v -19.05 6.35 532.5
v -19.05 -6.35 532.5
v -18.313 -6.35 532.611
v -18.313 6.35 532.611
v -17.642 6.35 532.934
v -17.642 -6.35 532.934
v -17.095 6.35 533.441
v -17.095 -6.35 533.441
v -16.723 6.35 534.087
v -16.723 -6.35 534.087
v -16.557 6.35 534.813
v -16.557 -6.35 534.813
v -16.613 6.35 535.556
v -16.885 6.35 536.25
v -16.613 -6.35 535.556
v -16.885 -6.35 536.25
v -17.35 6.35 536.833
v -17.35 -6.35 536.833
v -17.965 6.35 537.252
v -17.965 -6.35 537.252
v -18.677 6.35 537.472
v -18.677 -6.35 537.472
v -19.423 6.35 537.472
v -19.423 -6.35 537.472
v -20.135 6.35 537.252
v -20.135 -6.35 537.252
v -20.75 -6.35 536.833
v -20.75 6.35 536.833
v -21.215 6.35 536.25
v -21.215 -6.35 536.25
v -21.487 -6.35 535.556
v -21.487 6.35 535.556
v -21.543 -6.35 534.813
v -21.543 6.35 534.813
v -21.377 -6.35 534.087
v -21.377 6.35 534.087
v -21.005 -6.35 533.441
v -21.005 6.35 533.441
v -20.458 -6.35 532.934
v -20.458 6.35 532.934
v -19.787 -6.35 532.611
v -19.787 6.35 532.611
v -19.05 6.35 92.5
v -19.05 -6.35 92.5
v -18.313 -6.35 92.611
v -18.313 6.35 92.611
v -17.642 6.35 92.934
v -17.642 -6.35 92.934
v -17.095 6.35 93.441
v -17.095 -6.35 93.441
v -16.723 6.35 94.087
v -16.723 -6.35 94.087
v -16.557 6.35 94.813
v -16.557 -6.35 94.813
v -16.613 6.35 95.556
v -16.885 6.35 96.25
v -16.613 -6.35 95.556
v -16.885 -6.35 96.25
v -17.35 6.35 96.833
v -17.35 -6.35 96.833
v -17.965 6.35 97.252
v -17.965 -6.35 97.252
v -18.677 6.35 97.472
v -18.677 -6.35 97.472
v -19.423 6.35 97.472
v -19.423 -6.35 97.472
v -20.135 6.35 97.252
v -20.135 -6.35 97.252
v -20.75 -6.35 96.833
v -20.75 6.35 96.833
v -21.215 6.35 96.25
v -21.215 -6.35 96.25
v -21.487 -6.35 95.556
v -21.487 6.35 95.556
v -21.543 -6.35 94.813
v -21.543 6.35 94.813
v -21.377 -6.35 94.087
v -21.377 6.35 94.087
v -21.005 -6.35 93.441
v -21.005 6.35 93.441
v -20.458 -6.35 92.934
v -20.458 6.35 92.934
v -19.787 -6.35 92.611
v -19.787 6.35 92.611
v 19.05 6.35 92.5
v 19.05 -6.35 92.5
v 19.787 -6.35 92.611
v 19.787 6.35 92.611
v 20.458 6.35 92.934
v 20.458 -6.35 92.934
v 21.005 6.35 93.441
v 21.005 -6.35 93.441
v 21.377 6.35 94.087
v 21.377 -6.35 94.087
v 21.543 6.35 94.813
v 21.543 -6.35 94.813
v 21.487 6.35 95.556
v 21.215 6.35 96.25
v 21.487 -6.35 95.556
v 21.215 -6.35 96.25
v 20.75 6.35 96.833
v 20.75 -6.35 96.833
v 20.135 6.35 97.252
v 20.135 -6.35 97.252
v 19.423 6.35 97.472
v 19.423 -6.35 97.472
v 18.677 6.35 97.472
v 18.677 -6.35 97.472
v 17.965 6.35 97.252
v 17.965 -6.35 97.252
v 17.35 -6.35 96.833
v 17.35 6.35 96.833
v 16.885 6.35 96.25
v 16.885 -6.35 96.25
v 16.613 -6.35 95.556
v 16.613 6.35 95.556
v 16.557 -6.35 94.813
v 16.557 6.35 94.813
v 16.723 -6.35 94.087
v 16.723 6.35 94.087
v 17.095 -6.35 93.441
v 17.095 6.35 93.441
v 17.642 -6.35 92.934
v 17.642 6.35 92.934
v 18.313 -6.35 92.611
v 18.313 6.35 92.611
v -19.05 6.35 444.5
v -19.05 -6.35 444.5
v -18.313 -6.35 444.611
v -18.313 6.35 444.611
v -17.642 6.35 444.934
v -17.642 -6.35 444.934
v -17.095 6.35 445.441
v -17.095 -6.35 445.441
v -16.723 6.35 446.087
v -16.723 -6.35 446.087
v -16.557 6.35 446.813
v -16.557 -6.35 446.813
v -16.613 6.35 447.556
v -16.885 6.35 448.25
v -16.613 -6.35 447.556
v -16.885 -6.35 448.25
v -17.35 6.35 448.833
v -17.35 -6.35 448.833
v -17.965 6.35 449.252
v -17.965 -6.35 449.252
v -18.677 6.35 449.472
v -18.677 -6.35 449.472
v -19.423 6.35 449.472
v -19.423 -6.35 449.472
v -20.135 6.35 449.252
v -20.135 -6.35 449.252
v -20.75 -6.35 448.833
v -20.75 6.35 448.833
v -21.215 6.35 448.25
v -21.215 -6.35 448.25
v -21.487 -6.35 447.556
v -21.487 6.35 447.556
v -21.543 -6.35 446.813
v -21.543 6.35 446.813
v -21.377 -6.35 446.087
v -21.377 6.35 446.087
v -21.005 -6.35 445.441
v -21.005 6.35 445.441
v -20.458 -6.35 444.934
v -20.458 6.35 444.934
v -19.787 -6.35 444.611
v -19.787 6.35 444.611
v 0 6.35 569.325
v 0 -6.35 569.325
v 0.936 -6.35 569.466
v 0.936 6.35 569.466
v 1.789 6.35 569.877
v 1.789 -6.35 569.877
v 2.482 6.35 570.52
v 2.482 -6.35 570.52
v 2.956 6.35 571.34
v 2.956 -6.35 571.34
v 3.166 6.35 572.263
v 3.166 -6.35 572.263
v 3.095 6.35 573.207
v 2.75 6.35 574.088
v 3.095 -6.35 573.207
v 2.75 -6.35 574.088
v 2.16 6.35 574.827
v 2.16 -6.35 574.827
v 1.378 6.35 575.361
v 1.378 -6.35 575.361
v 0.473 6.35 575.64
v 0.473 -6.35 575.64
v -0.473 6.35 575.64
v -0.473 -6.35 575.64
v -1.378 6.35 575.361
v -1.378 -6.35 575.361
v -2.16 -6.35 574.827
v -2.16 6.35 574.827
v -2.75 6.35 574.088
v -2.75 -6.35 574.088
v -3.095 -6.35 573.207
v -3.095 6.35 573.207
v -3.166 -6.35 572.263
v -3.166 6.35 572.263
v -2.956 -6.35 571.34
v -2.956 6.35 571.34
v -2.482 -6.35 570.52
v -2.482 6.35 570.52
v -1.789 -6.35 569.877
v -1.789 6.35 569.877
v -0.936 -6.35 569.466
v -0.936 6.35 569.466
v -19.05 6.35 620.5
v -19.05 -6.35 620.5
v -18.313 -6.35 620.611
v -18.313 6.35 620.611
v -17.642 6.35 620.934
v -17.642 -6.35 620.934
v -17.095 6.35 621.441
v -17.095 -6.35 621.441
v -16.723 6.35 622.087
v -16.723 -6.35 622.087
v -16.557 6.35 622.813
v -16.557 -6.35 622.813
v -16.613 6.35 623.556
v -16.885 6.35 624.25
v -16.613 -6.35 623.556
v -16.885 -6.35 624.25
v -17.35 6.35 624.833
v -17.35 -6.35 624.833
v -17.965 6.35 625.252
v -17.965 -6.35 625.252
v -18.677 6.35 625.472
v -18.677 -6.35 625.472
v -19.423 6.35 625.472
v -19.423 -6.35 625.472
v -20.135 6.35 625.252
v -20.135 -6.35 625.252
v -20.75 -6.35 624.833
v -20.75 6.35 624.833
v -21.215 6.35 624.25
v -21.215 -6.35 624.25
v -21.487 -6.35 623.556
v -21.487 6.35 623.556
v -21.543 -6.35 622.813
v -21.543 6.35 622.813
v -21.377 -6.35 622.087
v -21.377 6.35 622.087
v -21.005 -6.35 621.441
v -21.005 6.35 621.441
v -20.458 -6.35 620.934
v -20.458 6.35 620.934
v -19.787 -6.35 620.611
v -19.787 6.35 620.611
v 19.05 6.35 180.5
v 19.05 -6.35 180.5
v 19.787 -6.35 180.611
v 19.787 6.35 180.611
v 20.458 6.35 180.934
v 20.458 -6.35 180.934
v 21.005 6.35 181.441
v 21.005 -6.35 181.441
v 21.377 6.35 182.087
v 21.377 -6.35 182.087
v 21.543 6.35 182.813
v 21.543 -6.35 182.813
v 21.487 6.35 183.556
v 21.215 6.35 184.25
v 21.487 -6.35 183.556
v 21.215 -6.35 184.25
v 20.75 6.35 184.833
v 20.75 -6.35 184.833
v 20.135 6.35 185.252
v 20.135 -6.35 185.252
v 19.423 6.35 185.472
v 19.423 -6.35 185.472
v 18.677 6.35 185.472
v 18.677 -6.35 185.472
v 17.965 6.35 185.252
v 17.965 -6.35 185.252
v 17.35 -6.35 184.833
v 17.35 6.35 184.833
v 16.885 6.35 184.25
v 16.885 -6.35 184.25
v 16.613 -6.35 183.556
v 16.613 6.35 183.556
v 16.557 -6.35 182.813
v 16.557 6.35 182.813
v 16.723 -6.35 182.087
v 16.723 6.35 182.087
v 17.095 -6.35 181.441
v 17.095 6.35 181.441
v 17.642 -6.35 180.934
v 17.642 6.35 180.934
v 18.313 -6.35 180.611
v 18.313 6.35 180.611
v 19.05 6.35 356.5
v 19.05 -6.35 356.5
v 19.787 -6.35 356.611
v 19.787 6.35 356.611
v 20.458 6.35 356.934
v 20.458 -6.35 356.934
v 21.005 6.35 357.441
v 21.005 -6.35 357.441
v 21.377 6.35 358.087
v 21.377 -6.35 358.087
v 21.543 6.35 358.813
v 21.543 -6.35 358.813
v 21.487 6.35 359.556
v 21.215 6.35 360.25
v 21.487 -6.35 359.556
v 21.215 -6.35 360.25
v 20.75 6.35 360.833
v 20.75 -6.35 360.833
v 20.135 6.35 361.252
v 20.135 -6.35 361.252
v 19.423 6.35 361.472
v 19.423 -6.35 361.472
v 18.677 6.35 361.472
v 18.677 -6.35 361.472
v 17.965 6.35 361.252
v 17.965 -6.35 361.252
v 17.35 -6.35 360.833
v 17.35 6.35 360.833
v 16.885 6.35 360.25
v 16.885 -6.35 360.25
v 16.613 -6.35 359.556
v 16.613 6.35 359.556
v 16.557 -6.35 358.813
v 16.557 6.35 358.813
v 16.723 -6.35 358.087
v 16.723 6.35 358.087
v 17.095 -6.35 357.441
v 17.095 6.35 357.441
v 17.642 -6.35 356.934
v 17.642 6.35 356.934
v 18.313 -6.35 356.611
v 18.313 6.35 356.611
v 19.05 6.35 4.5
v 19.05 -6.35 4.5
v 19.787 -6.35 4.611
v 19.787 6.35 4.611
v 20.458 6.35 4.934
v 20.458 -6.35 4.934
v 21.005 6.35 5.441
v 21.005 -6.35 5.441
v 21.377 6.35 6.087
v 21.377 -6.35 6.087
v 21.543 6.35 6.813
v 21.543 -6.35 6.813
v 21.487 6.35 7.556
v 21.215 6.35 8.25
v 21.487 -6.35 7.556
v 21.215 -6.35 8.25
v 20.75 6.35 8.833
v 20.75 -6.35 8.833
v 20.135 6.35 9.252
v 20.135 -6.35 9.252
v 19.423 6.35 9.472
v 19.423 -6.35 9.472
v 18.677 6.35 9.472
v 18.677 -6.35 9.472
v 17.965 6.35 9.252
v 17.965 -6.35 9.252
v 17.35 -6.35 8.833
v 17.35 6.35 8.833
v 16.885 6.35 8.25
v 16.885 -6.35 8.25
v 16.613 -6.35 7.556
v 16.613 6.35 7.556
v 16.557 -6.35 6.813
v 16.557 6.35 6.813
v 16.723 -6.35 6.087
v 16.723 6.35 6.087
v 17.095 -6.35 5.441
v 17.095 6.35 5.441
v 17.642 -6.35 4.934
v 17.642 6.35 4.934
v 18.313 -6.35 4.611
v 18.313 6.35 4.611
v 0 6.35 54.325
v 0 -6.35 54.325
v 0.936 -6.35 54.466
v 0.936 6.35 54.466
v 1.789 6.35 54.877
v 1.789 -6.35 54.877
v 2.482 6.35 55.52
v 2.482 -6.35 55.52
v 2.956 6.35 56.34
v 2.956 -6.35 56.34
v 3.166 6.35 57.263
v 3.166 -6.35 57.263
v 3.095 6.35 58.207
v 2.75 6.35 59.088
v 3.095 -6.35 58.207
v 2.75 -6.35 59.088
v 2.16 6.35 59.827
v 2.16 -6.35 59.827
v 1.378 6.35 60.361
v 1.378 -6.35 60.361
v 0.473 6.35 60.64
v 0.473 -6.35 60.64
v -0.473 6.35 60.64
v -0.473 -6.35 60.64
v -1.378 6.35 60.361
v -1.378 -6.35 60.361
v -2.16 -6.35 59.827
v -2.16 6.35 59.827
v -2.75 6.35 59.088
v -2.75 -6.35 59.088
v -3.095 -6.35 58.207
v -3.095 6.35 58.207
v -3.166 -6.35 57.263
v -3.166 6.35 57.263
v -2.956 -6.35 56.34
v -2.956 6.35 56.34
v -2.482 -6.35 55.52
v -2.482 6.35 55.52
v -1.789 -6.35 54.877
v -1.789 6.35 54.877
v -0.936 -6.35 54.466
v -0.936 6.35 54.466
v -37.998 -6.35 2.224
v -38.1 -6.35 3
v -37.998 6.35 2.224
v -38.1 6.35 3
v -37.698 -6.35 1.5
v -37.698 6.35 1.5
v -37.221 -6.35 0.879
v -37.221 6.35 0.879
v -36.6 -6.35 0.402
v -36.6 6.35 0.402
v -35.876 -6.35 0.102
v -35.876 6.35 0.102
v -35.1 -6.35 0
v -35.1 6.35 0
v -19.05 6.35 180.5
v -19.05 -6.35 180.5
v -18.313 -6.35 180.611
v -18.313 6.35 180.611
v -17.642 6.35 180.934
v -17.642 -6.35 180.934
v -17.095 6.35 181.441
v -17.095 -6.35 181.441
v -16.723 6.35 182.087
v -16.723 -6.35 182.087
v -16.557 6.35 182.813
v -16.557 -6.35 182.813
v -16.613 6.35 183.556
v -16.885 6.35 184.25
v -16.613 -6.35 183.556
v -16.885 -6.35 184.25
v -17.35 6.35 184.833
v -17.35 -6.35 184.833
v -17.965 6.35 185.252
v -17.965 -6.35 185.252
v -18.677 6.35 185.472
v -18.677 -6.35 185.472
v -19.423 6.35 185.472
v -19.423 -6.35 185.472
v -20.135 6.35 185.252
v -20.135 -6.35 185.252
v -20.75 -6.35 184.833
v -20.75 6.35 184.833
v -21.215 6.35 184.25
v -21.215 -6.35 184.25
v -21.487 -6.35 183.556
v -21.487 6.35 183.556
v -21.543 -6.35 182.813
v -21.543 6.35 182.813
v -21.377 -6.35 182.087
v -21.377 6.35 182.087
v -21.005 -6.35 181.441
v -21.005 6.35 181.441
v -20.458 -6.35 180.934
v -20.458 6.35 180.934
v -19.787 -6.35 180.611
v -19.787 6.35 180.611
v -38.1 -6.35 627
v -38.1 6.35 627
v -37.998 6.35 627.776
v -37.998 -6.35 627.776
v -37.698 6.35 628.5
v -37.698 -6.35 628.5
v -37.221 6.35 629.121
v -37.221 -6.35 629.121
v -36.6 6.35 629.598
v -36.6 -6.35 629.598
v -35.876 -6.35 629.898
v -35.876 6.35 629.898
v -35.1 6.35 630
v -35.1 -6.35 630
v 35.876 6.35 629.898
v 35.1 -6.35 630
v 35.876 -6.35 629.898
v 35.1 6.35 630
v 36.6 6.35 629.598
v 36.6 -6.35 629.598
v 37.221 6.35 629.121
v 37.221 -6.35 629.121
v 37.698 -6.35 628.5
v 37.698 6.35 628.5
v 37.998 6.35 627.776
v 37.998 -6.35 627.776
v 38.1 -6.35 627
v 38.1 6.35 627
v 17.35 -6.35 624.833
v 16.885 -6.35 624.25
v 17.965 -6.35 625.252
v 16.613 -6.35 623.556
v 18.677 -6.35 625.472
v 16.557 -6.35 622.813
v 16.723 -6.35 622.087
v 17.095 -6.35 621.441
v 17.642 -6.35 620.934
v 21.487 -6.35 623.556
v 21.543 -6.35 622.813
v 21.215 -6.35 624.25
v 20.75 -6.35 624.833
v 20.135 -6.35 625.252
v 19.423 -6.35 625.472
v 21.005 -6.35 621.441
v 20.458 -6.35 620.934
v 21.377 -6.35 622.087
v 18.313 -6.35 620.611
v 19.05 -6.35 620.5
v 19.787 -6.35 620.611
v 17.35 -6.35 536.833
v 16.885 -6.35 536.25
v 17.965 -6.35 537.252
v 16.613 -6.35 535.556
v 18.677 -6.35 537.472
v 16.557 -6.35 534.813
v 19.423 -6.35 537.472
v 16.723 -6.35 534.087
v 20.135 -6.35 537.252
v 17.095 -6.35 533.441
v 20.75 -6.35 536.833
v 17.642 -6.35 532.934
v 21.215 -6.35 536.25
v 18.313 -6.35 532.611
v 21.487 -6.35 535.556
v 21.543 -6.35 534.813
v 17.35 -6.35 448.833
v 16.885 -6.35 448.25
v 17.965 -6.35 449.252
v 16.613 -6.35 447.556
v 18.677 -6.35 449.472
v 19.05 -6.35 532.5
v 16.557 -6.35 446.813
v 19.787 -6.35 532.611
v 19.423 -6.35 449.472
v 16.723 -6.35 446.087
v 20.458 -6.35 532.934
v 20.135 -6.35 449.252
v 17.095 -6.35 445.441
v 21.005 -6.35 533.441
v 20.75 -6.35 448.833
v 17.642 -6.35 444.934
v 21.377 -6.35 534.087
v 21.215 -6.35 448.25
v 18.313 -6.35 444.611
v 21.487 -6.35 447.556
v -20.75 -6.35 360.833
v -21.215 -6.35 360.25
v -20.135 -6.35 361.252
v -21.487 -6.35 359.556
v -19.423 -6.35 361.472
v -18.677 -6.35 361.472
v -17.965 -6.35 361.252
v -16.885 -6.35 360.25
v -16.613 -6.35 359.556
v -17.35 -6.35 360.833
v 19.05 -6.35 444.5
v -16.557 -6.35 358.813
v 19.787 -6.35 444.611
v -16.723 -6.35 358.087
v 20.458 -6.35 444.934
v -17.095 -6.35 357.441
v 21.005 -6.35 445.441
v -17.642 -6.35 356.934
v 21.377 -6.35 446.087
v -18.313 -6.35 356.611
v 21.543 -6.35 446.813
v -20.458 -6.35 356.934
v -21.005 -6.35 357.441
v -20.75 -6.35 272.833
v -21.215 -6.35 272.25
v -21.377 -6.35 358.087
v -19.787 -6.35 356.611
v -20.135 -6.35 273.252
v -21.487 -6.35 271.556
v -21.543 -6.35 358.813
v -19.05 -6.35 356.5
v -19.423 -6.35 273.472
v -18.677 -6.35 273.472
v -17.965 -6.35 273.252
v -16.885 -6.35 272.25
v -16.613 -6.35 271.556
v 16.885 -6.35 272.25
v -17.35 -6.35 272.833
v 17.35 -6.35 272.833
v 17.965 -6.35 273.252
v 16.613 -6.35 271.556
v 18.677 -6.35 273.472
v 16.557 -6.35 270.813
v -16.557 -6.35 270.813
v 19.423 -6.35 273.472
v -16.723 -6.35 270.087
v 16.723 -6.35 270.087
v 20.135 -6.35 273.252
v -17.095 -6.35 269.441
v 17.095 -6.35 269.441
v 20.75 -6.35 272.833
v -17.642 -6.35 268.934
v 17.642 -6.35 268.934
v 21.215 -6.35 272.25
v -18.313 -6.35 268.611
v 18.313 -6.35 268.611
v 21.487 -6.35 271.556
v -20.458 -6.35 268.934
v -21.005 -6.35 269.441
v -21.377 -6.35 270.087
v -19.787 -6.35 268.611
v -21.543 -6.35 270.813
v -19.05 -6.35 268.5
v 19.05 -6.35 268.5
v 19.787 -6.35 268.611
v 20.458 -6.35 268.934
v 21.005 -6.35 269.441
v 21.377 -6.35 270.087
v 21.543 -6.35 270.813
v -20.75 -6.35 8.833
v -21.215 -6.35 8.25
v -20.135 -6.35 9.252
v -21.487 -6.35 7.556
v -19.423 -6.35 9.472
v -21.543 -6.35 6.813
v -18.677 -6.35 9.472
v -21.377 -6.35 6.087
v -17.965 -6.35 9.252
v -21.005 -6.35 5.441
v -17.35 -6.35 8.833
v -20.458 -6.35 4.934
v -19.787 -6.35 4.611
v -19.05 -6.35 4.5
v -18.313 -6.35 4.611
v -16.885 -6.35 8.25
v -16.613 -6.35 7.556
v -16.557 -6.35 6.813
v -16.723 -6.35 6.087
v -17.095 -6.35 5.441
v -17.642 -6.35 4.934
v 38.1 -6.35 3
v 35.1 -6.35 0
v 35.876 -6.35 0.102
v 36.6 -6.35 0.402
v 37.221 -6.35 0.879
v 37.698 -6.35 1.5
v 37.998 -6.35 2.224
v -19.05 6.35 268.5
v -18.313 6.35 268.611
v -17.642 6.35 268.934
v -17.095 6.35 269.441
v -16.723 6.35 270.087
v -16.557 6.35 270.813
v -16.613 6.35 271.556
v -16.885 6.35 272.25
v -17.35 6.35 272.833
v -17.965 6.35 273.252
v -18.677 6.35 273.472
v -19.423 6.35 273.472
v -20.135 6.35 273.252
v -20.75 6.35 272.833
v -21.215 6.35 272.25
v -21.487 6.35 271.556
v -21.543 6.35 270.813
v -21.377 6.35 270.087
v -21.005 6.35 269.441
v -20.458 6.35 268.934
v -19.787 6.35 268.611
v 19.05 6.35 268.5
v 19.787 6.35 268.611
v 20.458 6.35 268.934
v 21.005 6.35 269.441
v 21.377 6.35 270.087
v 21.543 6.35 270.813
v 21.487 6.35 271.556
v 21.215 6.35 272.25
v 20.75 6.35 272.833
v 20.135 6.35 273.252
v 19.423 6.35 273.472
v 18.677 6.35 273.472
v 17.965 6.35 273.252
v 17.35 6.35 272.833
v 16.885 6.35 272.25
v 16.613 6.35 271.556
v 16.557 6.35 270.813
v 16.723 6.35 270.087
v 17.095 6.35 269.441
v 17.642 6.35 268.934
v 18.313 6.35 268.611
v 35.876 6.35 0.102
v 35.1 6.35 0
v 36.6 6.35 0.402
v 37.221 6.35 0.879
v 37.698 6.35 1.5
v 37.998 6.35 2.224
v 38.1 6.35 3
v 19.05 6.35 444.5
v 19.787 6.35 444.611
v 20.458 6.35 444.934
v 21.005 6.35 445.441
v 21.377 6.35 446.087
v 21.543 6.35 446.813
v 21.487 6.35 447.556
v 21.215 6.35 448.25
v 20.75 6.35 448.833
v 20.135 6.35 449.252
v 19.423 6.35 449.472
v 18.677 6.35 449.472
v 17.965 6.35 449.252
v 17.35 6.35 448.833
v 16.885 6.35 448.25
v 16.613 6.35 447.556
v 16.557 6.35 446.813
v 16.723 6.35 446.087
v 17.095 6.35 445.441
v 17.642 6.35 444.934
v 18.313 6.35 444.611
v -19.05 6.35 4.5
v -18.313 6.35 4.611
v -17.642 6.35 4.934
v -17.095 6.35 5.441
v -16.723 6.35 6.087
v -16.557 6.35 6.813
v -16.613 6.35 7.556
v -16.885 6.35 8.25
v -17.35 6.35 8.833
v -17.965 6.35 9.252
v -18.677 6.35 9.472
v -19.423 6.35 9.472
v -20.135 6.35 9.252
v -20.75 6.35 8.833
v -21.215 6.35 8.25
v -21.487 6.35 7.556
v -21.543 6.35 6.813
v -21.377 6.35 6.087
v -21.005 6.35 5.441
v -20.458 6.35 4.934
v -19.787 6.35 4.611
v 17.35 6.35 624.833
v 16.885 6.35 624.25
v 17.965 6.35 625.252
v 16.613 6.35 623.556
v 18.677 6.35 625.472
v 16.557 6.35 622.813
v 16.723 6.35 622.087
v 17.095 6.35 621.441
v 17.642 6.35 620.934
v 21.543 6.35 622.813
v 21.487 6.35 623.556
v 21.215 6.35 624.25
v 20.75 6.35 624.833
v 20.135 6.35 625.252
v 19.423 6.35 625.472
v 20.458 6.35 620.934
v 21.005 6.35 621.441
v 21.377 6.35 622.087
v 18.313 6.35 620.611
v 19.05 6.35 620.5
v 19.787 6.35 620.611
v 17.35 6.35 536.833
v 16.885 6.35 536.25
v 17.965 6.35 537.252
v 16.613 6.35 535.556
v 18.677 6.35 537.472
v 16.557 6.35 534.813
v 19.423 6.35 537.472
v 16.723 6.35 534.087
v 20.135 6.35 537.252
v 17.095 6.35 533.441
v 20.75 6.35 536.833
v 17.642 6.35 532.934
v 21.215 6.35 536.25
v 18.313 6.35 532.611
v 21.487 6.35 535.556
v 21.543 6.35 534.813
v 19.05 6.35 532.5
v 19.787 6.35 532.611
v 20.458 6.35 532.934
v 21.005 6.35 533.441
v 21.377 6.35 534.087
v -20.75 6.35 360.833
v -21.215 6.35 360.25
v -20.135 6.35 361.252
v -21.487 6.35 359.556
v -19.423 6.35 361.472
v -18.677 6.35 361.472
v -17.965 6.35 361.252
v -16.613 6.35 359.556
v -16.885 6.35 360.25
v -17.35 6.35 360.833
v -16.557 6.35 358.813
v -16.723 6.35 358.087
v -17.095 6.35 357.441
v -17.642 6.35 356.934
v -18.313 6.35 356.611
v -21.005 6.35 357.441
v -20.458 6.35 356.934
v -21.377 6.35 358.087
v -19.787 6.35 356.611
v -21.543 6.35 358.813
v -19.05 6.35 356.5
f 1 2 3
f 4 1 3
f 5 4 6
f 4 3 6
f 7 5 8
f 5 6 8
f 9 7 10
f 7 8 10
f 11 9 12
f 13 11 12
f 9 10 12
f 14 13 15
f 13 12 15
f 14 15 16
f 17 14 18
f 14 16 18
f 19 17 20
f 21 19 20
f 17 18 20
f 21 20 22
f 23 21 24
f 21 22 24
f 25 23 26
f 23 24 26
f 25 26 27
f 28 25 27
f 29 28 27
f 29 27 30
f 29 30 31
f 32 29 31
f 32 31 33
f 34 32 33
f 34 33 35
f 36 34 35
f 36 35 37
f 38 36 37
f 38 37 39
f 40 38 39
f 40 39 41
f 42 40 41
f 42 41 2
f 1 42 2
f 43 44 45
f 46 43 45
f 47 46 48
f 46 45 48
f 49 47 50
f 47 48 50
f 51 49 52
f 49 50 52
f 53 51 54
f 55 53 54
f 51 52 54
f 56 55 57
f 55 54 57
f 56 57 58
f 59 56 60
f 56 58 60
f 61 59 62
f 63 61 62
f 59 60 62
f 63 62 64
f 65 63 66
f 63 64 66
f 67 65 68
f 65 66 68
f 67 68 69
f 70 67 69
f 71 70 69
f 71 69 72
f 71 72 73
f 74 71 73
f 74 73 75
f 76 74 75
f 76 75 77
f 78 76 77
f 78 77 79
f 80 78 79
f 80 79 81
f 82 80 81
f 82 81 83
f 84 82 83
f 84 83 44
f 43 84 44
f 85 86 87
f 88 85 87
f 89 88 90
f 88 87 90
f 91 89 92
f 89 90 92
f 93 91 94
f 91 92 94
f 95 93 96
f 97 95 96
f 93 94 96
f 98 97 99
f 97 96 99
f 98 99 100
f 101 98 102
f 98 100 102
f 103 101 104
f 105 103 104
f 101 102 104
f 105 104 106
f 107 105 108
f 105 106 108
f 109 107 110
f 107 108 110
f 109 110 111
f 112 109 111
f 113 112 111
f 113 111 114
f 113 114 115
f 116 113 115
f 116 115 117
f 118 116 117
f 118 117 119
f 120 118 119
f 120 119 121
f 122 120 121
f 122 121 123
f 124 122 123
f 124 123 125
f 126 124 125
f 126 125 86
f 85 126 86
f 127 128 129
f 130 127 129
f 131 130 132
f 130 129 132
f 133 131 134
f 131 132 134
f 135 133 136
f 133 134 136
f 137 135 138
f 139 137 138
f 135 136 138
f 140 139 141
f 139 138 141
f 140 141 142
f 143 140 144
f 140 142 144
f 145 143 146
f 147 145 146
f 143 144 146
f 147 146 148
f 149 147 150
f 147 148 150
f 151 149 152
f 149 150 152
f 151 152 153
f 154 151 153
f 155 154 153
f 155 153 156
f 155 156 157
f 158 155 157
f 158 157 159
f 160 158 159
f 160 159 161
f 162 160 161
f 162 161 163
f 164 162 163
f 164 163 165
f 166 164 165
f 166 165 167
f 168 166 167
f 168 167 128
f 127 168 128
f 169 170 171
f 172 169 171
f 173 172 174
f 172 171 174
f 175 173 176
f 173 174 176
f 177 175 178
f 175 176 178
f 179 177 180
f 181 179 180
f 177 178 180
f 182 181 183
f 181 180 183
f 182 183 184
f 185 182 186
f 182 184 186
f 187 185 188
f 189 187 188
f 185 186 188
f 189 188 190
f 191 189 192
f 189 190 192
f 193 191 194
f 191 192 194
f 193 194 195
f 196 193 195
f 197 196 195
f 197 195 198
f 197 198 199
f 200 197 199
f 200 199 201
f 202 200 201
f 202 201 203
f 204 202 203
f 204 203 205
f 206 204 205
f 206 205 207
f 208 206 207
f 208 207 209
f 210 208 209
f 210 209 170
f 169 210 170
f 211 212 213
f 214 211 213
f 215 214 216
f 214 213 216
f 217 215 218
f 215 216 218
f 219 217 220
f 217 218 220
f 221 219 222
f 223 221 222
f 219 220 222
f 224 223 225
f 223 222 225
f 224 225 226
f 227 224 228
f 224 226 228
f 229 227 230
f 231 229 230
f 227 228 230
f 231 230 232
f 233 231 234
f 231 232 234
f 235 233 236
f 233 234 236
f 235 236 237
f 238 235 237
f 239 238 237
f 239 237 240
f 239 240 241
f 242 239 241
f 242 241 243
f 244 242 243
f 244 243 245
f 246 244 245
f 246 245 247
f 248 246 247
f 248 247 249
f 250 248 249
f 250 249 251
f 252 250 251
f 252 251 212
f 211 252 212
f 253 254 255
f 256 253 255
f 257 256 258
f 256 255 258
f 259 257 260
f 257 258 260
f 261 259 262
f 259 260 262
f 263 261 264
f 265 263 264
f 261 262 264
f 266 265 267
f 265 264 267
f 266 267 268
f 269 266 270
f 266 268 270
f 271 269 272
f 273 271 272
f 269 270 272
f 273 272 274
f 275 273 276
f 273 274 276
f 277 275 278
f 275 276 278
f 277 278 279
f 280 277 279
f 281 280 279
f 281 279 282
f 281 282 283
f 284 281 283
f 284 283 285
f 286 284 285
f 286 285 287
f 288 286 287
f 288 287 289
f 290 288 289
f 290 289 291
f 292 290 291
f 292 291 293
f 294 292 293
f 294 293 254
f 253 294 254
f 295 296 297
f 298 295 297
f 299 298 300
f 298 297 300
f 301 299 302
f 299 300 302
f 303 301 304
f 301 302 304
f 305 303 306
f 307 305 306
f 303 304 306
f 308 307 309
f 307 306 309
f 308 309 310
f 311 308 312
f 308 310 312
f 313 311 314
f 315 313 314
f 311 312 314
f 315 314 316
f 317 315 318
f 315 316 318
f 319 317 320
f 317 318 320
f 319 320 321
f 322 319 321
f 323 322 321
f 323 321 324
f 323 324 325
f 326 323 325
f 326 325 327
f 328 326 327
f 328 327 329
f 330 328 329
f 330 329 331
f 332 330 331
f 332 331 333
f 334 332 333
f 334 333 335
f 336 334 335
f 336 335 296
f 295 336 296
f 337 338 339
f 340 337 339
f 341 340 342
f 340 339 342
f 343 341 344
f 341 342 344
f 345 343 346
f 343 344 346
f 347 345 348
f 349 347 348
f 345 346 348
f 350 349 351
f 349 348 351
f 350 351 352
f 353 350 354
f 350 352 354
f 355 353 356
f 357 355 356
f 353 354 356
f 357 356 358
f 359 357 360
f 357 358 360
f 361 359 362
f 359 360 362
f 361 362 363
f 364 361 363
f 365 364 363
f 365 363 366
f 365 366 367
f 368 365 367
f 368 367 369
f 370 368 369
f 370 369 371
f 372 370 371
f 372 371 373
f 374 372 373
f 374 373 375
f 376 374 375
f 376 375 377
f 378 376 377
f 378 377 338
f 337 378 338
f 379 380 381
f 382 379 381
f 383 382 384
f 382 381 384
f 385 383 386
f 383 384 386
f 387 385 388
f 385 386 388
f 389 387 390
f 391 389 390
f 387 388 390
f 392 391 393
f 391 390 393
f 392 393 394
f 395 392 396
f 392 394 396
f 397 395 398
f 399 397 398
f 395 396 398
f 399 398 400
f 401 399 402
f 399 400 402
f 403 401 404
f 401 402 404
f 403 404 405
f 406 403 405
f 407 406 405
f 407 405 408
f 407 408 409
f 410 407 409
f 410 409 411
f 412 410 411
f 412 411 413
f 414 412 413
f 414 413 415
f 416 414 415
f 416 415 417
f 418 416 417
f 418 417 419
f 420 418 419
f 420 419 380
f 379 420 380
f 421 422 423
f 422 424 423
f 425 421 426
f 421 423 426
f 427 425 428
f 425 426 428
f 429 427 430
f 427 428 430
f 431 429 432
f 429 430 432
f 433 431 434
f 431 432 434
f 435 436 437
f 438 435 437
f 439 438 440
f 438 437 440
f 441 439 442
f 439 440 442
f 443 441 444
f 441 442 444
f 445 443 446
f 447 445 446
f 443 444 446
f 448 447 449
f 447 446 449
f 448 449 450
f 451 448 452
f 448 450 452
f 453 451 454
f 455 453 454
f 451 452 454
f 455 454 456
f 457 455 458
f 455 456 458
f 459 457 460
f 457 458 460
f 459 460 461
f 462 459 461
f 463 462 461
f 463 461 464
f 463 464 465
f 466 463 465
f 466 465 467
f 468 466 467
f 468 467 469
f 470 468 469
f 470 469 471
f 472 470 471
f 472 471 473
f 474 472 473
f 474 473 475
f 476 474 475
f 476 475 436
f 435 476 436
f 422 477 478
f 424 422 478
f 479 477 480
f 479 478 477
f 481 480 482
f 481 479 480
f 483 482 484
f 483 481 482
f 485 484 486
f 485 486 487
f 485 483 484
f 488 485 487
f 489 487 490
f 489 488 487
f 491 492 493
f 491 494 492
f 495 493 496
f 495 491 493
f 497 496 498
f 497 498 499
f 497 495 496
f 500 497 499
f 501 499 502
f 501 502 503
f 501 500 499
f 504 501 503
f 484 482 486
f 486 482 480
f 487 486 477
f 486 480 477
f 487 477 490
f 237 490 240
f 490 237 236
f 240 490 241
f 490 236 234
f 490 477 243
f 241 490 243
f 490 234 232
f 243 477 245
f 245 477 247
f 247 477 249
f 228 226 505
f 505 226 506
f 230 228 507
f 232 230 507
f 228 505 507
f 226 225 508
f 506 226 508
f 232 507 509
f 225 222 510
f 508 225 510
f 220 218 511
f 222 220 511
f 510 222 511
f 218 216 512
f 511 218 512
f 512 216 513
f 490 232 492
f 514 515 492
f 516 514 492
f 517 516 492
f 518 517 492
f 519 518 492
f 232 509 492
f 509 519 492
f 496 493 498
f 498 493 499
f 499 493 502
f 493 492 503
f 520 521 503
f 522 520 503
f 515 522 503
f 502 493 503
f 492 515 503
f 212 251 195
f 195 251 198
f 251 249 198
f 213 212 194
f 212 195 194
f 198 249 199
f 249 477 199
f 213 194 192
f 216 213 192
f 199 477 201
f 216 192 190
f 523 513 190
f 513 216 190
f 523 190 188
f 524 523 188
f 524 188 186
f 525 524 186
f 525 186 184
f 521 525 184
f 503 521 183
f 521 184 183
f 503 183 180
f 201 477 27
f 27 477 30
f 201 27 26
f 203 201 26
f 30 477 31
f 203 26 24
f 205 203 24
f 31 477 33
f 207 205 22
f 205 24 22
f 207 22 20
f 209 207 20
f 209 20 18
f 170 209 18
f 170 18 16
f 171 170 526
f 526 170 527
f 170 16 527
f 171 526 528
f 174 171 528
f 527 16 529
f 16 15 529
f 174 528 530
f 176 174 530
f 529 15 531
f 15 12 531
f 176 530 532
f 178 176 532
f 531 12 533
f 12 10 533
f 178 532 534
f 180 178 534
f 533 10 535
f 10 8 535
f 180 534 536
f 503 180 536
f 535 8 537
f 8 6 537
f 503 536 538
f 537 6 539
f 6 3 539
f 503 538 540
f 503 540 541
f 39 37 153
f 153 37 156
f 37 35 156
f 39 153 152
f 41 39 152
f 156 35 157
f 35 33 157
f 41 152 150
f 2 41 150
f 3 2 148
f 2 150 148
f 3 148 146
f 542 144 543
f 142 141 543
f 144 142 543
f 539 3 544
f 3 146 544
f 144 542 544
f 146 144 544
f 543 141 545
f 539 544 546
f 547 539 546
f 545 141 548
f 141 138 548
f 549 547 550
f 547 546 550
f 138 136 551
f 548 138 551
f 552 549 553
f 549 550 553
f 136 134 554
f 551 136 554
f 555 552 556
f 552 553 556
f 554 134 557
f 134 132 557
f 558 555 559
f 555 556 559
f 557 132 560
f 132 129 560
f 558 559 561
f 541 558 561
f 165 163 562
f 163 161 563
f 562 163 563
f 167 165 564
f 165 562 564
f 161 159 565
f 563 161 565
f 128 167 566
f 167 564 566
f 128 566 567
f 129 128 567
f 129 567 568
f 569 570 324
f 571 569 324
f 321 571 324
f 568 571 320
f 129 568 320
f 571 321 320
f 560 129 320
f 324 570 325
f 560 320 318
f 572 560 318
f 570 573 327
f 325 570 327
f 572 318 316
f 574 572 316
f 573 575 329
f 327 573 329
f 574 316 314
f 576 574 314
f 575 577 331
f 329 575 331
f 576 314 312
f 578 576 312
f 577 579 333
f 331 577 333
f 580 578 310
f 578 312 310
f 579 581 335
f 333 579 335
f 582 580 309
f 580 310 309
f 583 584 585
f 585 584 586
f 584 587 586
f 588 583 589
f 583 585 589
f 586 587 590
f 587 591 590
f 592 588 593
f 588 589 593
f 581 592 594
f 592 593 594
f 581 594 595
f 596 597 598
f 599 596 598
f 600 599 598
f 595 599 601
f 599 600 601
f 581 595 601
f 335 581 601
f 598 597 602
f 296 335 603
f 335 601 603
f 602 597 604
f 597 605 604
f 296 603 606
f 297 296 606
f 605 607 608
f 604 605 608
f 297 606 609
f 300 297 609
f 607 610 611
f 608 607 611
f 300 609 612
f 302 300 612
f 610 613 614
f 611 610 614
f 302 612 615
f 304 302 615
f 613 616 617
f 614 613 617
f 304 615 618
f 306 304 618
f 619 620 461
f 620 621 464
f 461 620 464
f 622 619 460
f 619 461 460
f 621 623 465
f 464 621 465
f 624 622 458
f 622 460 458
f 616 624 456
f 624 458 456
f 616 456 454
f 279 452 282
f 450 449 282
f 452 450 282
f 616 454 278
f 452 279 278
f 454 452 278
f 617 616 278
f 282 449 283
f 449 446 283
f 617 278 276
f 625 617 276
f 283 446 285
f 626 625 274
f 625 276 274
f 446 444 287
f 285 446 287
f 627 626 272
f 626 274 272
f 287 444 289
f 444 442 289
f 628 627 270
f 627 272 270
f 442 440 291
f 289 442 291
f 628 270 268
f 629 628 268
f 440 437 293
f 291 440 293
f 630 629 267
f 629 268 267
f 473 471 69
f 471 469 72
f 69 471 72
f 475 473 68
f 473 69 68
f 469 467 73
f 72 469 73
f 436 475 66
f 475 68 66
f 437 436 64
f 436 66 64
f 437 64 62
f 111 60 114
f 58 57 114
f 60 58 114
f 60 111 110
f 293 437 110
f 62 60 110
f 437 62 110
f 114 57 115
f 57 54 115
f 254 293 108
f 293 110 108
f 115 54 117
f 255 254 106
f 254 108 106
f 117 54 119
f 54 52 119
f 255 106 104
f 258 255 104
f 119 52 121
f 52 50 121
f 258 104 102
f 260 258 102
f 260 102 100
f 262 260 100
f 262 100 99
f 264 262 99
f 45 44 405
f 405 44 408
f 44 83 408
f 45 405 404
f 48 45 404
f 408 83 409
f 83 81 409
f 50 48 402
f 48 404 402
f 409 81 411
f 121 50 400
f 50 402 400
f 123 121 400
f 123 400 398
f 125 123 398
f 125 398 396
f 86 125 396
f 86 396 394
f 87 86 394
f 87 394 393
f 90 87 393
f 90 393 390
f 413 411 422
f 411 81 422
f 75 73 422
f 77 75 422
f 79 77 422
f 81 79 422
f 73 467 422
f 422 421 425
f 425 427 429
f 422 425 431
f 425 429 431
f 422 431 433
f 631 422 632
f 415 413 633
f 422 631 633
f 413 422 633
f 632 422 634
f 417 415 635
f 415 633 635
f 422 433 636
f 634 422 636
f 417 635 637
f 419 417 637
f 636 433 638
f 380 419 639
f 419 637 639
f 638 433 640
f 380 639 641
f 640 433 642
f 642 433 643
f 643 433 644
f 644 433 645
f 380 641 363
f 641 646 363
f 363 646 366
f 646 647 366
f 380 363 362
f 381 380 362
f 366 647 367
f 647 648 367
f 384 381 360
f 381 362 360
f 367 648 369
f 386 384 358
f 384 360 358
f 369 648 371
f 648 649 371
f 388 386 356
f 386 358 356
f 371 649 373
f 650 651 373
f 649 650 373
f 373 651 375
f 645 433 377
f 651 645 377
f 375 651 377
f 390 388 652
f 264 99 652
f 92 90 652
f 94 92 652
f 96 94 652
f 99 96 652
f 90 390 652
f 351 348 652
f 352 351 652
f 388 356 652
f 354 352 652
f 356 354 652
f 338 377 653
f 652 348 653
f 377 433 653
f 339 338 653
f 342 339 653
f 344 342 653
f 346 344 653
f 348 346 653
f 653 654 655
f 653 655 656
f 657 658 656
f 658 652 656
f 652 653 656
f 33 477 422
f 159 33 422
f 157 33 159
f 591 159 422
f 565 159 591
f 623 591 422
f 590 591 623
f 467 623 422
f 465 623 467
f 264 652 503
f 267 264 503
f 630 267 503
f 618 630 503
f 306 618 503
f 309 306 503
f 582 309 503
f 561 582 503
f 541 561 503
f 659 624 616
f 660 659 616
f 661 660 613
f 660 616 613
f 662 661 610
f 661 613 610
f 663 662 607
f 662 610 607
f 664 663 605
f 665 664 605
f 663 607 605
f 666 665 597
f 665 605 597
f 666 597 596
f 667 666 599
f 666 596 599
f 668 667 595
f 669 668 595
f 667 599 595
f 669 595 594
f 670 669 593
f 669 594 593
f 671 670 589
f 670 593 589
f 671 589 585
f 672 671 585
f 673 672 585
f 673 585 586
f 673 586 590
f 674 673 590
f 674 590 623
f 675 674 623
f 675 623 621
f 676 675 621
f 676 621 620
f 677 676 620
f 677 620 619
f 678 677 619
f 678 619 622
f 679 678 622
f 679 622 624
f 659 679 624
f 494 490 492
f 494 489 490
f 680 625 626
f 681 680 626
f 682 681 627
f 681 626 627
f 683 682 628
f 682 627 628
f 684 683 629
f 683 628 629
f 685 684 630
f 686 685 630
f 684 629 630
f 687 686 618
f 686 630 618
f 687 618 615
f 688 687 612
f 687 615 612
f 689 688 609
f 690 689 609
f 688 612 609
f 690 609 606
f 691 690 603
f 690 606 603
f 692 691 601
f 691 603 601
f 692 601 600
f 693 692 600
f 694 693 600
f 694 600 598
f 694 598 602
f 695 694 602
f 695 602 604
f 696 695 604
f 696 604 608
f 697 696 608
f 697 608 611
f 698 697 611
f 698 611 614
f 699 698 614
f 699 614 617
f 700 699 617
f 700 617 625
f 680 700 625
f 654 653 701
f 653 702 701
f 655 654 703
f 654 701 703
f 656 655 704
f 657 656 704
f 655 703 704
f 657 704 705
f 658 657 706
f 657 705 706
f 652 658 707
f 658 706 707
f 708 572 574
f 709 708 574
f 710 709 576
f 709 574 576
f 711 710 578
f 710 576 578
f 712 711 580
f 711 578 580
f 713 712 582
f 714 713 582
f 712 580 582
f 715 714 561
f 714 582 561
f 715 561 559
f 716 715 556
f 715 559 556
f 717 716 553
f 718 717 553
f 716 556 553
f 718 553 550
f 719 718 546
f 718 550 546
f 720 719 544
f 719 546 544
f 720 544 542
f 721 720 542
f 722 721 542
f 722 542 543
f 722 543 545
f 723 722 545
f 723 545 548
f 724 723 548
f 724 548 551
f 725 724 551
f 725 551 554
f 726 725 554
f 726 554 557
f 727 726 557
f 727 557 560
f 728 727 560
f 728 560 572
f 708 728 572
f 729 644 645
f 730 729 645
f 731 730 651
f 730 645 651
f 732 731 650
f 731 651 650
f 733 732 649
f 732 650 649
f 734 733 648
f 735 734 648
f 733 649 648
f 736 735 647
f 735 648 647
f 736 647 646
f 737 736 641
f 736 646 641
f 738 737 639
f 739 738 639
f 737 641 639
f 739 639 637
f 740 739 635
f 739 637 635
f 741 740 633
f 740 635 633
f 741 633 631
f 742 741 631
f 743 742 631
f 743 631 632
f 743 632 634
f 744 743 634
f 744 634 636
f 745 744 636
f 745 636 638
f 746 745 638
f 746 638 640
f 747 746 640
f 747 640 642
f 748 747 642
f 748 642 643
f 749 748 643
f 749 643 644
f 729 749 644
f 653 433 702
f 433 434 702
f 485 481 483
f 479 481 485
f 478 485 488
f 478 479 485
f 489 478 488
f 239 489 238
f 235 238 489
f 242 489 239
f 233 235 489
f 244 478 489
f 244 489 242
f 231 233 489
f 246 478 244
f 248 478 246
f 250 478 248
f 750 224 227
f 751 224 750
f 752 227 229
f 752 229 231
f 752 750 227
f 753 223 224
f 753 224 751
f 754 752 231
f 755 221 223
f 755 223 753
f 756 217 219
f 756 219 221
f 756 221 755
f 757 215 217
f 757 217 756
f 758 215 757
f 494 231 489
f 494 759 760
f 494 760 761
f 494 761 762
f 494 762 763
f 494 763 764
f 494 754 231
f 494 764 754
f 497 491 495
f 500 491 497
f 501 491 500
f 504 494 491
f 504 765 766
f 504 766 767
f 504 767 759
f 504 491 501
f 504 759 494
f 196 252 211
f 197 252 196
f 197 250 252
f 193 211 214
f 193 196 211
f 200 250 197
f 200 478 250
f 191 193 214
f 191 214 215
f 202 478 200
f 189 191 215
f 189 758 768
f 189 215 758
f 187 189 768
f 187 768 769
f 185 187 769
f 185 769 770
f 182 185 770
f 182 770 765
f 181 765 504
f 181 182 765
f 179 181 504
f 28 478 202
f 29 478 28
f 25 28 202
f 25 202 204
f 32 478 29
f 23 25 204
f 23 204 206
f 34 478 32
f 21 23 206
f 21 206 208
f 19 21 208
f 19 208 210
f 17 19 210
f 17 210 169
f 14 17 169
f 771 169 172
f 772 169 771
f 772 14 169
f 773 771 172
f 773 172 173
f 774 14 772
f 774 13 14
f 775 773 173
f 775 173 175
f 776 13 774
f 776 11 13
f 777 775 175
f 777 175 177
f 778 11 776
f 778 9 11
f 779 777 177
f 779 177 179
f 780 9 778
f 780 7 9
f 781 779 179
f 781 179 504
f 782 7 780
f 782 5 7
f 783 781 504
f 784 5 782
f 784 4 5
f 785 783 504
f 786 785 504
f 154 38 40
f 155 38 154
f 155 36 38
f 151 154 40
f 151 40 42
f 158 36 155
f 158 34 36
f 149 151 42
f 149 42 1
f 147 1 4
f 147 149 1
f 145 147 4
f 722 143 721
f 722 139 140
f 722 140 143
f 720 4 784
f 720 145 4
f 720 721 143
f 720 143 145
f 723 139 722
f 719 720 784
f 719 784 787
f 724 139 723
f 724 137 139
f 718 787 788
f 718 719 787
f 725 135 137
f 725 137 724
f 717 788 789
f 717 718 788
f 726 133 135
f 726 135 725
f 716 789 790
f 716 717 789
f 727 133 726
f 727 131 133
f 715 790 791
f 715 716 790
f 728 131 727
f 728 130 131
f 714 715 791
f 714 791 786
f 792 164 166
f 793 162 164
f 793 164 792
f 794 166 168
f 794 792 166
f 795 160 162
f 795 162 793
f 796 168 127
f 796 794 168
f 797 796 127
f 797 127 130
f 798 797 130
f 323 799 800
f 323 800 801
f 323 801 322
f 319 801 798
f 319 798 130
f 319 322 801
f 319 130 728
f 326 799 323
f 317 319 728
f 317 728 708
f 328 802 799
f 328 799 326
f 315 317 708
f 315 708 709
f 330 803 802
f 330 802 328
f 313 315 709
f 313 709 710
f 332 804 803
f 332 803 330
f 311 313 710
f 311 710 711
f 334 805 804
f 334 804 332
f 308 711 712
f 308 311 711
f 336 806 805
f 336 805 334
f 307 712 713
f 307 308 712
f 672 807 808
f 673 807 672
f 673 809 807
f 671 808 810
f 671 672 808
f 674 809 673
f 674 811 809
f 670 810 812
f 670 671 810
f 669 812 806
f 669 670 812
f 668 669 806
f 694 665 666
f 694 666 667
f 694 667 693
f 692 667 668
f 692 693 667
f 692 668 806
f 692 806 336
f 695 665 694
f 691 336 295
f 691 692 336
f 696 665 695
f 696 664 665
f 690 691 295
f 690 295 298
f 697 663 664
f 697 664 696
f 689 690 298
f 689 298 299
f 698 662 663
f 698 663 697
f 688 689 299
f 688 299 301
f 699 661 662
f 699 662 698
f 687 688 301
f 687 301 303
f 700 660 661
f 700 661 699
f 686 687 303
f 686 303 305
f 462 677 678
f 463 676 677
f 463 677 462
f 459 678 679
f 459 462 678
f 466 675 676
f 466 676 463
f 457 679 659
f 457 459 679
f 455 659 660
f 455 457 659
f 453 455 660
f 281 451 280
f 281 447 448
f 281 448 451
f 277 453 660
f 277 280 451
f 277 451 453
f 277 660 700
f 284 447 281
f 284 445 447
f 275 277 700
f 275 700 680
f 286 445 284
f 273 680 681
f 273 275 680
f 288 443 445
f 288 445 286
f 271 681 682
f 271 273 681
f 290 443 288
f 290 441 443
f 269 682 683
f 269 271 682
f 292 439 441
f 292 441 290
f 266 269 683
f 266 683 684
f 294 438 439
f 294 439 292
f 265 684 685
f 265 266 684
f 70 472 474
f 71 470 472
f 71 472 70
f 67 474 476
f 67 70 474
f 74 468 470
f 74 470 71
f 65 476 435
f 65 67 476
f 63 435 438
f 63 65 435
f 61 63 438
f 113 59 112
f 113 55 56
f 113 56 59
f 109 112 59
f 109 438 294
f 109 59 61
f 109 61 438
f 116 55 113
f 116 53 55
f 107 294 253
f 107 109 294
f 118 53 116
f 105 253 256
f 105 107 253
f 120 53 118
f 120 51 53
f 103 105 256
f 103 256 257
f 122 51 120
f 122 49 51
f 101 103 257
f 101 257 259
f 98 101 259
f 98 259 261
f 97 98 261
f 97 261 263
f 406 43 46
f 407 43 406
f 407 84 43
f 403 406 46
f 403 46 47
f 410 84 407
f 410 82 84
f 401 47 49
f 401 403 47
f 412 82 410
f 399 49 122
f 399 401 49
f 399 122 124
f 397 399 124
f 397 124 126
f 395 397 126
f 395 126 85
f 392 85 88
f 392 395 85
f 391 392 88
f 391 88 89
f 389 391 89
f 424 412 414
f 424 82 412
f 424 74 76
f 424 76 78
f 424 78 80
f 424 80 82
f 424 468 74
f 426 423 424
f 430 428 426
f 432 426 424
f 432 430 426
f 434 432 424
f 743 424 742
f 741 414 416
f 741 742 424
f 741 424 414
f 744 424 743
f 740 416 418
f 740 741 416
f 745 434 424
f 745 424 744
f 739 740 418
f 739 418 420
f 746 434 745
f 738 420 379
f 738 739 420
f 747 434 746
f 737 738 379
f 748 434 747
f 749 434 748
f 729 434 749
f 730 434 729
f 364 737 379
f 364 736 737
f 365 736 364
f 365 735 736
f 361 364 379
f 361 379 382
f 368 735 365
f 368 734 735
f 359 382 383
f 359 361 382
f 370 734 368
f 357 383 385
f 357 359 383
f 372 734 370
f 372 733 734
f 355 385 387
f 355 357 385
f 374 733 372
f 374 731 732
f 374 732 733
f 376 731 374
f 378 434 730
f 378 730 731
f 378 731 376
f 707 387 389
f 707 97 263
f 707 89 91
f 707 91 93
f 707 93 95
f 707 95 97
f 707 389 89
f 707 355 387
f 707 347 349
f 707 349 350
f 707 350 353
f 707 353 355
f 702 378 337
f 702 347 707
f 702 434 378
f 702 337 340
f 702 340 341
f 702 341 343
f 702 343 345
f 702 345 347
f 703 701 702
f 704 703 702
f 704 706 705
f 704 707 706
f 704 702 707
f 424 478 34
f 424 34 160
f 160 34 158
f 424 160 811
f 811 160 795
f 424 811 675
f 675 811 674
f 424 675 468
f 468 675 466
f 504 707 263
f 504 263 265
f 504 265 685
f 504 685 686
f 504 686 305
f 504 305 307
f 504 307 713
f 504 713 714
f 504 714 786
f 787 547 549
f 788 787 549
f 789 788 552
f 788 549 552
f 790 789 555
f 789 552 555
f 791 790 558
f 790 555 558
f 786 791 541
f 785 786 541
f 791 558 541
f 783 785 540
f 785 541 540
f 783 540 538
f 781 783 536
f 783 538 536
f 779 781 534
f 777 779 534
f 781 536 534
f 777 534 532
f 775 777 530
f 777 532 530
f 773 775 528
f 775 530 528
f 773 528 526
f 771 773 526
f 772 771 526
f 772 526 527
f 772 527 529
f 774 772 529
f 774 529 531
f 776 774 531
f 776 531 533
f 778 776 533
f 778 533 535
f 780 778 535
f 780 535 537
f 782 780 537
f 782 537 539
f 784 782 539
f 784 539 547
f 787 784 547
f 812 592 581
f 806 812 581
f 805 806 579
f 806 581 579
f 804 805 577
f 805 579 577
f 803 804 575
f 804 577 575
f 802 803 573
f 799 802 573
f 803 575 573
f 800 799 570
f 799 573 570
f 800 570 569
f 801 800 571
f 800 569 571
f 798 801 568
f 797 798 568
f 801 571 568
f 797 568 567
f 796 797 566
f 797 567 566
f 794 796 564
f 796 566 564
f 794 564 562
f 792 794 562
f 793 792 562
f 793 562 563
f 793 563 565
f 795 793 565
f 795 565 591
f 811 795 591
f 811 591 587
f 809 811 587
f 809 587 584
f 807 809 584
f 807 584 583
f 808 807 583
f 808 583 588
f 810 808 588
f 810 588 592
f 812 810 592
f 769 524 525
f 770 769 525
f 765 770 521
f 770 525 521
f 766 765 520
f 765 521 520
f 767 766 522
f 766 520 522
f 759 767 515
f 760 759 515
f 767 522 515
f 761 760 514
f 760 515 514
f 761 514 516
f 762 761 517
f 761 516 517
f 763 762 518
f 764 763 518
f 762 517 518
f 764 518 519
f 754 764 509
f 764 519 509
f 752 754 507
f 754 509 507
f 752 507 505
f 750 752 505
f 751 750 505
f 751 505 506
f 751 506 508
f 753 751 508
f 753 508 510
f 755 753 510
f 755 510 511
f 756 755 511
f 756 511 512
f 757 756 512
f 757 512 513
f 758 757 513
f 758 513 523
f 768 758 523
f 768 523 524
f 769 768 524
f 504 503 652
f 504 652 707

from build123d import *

# Parameters (mm, degrees)
SKETCH1_W           = 76.2
SKETCH1_H           = 12.7
BOSS_EXTRUDE1_DEPTH = 630
SKETCH2_R           = 3.175
CUT_EXTRUDE1_DEPTH  = 632.278781522
SKETCH3_R           = 2.5
CUT_EXTRUDE2_DEPTH  = 632.278781522
FILLET1_R           = 3


with BuildPart() as part:
    # Sketch1 → Boss-Extrude1 (new body)
    with BuildSketch(Plane.XY):
        Rectangle(SKETCH1_W, SKETCH1_H)
    extrude(amount=BOSS_EXTRUDE1_DEPTH)

    # Sketch2 → Cut-Extrude1 (cut, through all)
    with BuildSketch(Plane.XZ.offset(6.35)):
        with Locations(Location((0, 57.5, 0), (0, 0, 270))):
            Circle(SKETCH2_R)
        with Locations(Location((0, 572.5, 0), (0, 0, 270))):
            Circle(SKETCH2_R)
    extrude(amount=-CUT_EXTRUDE1_DEPTH, mode=Mode.SUBTRACT)

    # Sketch3 → Cut-Extrude2 (cut, through all)
    with BuildSketch(Plane.XZ.offset(6.35)):
        with Locations(Location((19.05, 7, 0), (0, 0, 270))):
            Circle(SKETCH3_R)
        with Locations(Location((-19.05, 7, 0), (0, 0, 270))):
            Circle(SKETCH3_R)
        with Locations(Location((-19.05, 95, 0), (0, 0, 270))):
            Circle(SKETCH3_R)
        with Locations(Location((-19.05, 183, 0), (0, 0, 270))):
            Circle(SKETCH3_R)
        with Locations(Location((-19.05, 271, 0), (0, 0, 270))):
            Circle(SKETCH3_R)
        with Locations(Location((-19.05, 359, 0), (0, 0, 270))):
            Circle(SKETCH3_R)
        with Locations(Location((-19.05, 447, 0), (0, 0, 270))):
            Circle(SKETCH3_R)
        with Locations(Location((-19.05, 535, 0), (0, 0, 270))):
            Circle(SKETCH3_R)
        with Locations(Location((-19.05, 623, 0), (0, 0, 270))):
            Circle(SKETCH3_R)
        with Locations(Location((19.05, 95, 0), (0, 0, 270))):
            Circle(SKETCH3_R)
        with Locations(Location((19.05, 183, 0), (0, 0, 270))):
            Circle(SKETCH3_R)
        with Locations(Location((19.05, 271, 0), (0, 0, 270))):
            Circle(SKETCH3_R)
        with Locations(Location((19.05, 359, 0), (0, 0, 270))):
            Circle(SKETCH3_R)
        with Locations(Location((19.05, 447, 0), (0, 0, 270))):
            Circle(SKETCH3_R)
        with Locations(Location((19.05, 535, 0), (0, 0, 270))):
            Circle(SKETCH3_R)
        with Locations(Location((19.05, 623, 0), (0, 0, 270))):
            Circle(SKETCH3_R)
    extrude(amount=-CUT_EXTRUDE2_DEPTH, mode=Mode.SUBTRACT)

    # Fillet1
    fillet1_edges = [part.edges().sort_by_distance(p)[0] for p in [
        (38.1, 0, 630),
        (-38.1, 0, 630),
        (38.1, 0, 0),
        (-38.1, 0, 0),
    ]]
    fillet(fillet1_edges, radius=FILLET1_R)


solid = part.part
